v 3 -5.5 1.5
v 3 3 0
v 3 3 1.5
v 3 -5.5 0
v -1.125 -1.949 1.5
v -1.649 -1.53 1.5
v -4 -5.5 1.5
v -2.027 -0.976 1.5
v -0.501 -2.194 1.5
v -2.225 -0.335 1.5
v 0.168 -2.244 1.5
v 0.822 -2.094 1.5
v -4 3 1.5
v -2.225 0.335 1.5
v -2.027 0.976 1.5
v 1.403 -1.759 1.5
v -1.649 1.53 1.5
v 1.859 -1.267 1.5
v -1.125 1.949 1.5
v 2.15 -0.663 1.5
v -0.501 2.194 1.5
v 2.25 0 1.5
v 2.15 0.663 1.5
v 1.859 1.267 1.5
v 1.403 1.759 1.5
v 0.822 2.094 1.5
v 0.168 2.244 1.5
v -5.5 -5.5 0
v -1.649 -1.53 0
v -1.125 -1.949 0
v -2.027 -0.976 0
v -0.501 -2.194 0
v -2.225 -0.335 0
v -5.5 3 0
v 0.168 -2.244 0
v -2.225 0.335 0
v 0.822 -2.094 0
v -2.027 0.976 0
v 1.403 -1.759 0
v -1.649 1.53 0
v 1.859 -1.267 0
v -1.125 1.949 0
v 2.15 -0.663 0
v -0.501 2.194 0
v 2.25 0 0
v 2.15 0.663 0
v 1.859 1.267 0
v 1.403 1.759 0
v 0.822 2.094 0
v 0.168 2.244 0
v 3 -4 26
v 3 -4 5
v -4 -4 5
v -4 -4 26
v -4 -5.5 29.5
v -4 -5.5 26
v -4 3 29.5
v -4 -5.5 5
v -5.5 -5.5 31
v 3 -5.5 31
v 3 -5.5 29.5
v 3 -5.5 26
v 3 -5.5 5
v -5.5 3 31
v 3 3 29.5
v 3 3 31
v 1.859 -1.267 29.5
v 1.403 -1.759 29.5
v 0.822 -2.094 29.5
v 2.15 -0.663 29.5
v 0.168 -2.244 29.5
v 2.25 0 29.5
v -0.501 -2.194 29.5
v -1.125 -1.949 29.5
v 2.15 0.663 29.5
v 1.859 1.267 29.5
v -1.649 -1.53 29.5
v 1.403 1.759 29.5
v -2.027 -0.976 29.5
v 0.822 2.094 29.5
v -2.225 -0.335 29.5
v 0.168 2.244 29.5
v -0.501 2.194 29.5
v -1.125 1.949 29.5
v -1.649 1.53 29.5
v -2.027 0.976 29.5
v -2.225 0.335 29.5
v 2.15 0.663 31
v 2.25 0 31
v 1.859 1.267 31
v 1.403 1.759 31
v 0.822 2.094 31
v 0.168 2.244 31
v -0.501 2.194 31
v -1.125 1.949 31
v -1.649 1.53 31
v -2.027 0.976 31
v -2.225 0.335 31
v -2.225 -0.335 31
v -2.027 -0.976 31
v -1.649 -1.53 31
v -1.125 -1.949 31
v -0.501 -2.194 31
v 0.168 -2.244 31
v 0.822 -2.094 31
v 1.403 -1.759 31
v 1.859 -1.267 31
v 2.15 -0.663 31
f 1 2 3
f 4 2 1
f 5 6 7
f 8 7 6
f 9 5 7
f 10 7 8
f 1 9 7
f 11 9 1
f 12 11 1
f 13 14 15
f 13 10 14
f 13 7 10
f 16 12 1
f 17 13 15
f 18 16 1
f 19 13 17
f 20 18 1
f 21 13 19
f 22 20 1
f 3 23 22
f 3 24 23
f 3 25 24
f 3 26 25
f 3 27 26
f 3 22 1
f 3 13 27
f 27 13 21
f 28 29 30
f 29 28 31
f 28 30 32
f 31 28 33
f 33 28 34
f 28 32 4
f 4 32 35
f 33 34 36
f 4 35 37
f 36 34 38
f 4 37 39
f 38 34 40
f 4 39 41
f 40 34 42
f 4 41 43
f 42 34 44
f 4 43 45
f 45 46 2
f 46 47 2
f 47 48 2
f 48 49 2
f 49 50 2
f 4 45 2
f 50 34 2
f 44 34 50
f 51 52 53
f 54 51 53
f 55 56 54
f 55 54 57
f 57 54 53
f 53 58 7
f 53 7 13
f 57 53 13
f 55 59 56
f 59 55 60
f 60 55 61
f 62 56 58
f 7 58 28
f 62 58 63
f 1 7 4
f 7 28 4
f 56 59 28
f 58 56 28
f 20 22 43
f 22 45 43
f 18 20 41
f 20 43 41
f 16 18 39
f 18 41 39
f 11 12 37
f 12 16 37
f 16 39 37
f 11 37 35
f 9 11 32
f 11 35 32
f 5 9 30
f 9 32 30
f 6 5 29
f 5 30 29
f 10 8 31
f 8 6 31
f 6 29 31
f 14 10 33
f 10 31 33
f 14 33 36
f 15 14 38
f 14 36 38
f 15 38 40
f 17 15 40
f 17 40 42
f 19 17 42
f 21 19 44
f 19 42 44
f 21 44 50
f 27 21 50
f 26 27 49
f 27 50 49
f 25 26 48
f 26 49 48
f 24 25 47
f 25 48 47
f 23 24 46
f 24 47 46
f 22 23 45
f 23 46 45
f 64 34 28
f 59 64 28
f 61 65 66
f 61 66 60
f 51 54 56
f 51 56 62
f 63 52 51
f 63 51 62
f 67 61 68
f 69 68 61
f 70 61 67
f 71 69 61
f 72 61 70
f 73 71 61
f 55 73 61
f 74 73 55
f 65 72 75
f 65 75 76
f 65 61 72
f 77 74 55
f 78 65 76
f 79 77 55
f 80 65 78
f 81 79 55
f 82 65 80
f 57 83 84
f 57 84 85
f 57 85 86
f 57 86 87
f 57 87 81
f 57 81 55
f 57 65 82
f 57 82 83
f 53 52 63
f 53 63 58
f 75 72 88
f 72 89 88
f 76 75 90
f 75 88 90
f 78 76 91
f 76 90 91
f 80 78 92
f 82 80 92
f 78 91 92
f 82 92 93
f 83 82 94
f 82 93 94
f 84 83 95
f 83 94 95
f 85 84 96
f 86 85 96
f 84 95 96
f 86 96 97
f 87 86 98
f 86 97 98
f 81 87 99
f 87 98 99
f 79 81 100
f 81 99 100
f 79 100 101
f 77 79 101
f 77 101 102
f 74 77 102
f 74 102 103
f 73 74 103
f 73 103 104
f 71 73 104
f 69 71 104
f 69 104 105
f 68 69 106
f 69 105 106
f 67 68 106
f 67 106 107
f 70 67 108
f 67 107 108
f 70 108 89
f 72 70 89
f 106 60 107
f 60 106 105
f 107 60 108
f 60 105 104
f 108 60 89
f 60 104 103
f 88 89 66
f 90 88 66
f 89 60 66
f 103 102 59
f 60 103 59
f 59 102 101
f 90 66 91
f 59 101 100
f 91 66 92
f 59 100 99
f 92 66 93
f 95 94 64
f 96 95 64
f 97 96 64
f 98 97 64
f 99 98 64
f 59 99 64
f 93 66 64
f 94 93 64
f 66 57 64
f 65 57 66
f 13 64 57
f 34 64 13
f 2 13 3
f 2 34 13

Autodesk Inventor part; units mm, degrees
ref_plane "YZ Plane" through (0, 0, 0) normal (1, 0, 0) x (0, 1, 0)
ref_plane "XZ Plane" through (0, 0, 0) normal (0, 1, 0) x (-1, 0, 0)
sketch "Sketch1" plane through (0, 0, 0) normal (0, 0, 1) x (1, 0, 0)
  circle A0 centre (0, 0) radius 2.25
  line L0 (-4, 3) -> (3, 3)
  line L1 (3, 3) -> (3, -4)
  line L2 (3, -4) -> (-4, -4)
  line L3 (-4, -4) -> (-4, 3)
  line L4 (-4, 3) -> (-5.5, 3)
  line L5 (-5.5, 3) -> (-5.5, -5.5)
  line L6 (-5.5, -5.5) -> (-4, -5.5)
  line L7 (-4, -5.5) -> (-4, 3)
  line L8 (3, -4) -> (-4, -4)
  line L9 (-4, -4) -> (-4, -5.5)
  line L10 (-4, -5.5) -> (3, -5.5)
  line L11 (3, -5.5) -> (3, -4)
  dimension "d0" = 4.5
  dimension "d1" = 4
  dimension "d2" = 4
  dimension "d3" = 3
  dimension "d5" = 3
  dimension "d6" = 1.5
  dimension "d7" = 1.5
extrude "Extrusion1" add sketch "Sketch1" along normal blind 1.5
extrude "Extrusion2" add sketch "Sketch1" along normal blind 29.5 contours L3 L7 L6 L5 L4 | L2 L11 L10 L7
ref_plane "Work Plane2" through (0, 0, 15.5) normal (0, 0, 1) x (1, 0, 0)
mirror "Mirror2" about plane through (0, 0, 15.5) normal (0, 0, 1) of "Extrusion1"
sketch "Sketch2" plane through (-4, -4, 1.5) normal (0, 1, 0) x (1, 0, 0)
  line L0 (7, 0) -> (7, -28) projected
  line L1 (0, 0) -> (7, 0)
  line L2 (7, 0) -> (7, -3.5)
  line L3 (7, -3.5) -> (0, -3.5)
  line L4 (0, -3.5) -> (0, 0)
  point P0 (4, 1.5)
  dimension "d13" = 3.5
extrude "Extrusion3" cut sketch "Sketch2" against normal blind 10
mirror "Mirror3" about plane through (0, 0, 15.5) normal (0, 0, 1) of "Extrusion3"
properties part number "Lifter"
